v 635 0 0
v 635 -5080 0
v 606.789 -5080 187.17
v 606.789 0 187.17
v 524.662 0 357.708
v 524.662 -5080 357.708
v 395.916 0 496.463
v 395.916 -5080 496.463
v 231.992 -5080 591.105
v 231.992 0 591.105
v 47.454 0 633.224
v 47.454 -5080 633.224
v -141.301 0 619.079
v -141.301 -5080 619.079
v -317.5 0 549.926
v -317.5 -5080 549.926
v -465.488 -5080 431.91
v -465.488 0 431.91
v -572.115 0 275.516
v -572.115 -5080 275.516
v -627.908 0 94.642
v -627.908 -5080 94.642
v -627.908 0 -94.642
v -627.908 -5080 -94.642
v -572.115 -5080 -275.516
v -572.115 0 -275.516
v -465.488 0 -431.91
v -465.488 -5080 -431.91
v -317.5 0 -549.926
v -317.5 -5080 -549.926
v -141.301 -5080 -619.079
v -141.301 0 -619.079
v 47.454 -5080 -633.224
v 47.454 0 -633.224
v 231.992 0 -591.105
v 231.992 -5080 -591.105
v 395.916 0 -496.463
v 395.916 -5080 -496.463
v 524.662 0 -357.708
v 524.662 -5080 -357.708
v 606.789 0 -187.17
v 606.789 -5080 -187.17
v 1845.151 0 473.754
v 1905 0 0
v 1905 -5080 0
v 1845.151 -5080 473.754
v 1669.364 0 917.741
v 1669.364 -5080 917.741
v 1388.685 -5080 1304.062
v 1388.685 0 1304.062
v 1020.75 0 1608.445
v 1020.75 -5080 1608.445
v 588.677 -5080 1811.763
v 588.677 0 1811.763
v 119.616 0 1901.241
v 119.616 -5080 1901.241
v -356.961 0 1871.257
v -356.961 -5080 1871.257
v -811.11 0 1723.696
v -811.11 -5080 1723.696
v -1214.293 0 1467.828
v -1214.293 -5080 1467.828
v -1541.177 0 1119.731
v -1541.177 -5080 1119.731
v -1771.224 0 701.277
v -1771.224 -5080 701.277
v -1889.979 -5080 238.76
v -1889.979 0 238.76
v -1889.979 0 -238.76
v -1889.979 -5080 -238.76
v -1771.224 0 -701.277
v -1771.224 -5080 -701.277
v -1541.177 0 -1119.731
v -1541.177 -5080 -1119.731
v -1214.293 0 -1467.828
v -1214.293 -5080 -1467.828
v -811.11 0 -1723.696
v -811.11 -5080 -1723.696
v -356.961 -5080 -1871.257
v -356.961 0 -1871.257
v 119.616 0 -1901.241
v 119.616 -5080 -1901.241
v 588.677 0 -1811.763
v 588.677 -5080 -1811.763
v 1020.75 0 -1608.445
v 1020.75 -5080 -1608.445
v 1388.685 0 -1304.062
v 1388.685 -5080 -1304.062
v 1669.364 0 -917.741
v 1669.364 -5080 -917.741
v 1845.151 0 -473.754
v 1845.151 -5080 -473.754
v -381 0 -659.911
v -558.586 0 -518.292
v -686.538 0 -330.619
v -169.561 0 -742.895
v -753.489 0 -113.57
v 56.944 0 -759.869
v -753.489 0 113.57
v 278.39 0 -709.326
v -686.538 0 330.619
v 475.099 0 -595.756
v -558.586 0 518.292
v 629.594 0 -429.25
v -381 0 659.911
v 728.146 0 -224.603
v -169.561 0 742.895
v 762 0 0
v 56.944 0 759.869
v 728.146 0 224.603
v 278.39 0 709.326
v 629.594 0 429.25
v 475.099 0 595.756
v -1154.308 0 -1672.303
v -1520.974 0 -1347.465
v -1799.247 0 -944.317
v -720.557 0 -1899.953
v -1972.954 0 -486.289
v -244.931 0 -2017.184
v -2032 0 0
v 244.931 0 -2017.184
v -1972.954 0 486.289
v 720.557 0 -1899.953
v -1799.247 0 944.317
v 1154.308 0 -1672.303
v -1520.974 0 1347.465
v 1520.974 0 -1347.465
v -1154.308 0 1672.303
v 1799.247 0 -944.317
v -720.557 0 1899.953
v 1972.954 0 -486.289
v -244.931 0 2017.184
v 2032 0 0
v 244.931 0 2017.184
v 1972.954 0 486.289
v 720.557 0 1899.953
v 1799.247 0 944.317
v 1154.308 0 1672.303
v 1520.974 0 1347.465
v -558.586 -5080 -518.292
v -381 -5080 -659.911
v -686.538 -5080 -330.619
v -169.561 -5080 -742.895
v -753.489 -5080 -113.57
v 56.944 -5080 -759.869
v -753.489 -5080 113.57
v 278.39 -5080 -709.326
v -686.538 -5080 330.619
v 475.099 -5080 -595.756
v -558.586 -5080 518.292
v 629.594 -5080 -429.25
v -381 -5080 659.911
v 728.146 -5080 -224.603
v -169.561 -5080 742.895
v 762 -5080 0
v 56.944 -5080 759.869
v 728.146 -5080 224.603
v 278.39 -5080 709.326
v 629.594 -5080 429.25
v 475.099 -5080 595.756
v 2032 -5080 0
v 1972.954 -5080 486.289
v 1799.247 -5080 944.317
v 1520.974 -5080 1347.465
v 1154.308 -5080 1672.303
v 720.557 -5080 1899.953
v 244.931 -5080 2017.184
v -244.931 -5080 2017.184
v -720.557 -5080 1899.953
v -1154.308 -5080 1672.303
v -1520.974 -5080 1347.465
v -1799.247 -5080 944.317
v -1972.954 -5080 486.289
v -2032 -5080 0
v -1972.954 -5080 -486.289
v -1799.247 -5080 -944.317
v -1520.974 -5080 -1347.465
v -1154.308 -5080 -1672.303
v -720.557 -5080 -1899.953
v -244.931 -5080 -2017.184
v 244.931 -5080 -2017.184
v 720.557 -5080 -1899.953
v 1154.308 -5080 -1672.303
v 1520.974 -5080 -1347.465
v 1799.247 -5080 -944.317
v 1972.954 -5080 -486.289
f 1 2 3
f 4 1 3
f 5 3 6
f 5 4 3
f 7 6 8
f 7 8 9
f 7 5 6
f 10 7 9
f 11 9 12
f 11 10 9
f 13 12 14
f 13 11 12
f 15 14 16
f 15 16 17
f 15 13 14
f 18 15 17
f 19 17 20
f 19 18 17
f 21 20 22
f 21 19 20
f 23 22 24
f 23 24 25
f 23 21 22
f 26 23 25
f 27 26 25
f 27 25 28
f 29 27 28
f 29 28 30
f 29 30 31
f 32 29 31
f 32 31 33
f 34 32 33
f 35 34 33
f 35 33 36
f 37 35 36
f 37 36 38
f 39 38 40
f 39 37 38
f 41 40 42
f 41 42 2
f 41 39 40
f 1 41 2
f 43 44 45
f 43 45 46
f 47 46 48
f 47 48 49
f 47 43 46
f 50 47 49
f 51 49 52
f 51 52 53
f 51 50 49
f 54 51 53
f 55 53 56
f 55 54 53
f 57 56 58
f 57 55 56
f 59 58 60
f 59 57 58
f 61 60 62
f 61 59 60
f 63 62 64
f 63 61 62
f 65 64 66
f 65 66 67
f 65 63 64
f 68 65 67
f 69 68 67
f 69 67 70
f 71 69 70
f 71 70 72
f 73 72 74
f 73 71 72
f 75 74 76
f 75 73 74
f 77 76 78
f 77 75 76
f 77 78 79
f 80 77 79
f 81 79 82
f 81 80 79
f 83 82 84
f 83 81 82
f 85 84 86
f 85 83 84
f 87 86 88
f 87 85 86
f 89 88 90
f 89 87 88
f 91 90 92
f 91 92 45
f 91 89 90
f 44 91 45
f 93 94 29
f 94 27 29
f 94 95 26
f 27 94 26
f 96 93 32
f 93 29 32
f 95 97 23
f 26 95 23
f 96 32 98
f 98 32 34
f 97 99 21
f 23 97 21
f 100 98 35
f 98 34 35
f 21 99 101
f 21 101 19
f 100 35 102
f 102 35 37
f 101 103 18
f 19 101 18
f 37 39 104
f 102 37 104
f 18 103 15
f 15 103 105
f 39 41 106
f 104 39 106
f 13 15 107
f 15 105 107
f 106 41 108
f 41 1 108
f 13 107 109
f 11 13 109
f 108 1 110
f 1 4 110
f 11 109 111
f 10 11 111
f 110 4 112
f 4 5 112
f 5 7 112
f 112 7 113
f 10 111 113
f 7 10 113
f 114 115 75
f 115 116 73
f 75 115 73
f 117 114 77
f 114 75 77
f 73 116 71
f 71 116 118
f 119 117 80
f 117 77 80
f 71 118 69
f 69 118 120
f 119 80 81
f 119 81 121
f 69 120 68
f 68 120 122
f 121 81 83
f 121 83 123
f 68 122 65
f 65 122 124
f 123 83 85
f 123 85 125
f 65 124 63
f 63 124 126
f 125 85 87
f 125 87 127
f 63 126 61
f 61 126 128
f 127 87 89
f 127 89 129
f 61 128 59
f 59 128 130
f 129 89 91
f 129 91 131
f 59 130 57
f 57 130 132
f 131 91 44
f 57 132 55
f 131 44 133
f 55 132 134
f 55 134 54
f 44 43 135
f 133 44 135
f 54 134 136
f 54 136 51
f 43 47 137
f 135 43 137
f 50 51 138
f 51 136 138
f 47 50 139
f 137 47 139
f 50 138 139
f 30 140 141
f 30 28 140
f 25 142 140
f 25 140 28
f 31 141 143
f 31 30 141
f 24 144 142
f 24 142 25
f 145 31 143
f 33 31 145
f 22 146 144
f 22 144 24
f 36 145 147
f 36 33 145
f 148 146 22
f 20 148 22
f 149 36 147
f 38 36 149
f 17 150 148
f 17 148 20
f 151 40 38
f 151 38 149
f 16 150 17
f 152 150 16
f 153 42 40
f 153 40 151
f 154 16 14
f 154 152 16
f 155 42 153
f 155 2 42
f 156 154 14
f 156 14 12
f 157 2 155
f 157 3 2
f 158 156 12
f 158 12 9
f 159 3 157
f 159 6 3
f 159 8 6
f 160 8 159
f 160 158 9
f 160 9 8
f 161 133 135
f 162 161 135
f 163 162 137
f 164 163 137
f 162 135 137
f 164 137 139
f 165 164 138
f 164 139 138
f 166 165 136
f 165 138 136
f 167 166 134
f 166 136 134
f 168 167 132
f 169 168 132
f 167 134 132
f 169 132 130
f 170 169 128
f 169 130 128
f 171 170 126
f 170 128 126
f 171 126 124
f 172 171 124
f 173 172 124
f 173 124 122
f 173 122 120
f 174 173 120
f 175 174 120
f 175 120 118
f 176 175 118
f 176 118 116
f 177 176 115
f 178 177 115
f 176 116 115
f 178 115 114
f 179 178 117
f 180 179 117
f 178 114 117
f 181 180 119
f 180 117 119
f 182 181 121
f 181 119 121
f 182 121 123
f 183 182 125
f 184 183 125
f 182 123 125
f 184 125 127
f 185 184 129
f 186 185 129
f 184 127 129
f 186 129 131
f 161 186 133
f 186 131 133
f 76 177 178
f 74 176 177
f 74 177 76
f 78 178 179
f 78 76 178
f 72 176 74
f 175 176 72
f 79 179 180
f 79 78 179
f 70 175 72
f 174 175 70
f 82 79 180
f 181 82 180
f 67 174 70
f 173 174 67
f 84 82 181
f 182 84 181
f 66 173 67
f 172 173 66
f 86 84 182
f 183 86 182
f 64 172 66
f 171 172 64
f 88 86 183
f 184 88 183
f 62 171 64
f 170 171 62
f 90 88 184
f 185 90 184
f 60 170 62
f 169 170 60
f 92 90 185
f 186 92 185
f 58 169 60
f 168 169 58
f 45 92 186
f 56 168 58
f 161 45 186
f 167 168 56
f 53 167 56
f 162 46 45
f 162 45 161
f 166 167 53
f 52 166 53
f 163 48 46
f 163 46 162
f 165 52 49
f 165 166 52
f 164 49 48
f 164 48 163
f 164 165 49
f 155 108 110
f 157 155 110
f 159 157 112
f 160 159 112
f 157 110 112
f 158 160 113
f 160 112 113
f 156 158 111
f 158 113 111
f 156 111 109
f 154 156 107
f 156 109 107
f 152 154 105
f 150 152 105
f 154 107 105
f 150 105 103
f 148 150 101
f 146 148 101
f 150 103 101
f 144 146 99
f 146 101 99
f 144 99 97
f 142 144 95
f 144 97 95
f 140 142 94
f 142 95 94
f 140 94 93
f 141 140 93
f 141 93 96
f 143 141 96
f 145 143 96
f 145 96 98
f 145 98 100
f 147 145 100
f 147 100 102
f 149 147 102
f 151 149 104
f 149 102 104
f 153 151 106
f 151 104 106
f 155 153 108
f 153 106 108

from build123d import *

# Parameters (mm, degrees)
F0_R     = 2032
F0_R_2   = 1905
F0_R_3   = 762
F0_R_4   = 635
F1_DEPTH = 5080


with BuildPart() as f1:
    # F0 (on Front) → F1 (new body)
    with BuildSketch(Plane.XZ):
        Circle(F0_R)
        Circle(F0_R_2, mode=Mode.SUBTRACT)
        Circle(F0_R_3)
        Circle(F0_R_4, mode=Mode.SUBTRACT)
    extrude(amount=F1_DEPTH)


solid = f1.part
